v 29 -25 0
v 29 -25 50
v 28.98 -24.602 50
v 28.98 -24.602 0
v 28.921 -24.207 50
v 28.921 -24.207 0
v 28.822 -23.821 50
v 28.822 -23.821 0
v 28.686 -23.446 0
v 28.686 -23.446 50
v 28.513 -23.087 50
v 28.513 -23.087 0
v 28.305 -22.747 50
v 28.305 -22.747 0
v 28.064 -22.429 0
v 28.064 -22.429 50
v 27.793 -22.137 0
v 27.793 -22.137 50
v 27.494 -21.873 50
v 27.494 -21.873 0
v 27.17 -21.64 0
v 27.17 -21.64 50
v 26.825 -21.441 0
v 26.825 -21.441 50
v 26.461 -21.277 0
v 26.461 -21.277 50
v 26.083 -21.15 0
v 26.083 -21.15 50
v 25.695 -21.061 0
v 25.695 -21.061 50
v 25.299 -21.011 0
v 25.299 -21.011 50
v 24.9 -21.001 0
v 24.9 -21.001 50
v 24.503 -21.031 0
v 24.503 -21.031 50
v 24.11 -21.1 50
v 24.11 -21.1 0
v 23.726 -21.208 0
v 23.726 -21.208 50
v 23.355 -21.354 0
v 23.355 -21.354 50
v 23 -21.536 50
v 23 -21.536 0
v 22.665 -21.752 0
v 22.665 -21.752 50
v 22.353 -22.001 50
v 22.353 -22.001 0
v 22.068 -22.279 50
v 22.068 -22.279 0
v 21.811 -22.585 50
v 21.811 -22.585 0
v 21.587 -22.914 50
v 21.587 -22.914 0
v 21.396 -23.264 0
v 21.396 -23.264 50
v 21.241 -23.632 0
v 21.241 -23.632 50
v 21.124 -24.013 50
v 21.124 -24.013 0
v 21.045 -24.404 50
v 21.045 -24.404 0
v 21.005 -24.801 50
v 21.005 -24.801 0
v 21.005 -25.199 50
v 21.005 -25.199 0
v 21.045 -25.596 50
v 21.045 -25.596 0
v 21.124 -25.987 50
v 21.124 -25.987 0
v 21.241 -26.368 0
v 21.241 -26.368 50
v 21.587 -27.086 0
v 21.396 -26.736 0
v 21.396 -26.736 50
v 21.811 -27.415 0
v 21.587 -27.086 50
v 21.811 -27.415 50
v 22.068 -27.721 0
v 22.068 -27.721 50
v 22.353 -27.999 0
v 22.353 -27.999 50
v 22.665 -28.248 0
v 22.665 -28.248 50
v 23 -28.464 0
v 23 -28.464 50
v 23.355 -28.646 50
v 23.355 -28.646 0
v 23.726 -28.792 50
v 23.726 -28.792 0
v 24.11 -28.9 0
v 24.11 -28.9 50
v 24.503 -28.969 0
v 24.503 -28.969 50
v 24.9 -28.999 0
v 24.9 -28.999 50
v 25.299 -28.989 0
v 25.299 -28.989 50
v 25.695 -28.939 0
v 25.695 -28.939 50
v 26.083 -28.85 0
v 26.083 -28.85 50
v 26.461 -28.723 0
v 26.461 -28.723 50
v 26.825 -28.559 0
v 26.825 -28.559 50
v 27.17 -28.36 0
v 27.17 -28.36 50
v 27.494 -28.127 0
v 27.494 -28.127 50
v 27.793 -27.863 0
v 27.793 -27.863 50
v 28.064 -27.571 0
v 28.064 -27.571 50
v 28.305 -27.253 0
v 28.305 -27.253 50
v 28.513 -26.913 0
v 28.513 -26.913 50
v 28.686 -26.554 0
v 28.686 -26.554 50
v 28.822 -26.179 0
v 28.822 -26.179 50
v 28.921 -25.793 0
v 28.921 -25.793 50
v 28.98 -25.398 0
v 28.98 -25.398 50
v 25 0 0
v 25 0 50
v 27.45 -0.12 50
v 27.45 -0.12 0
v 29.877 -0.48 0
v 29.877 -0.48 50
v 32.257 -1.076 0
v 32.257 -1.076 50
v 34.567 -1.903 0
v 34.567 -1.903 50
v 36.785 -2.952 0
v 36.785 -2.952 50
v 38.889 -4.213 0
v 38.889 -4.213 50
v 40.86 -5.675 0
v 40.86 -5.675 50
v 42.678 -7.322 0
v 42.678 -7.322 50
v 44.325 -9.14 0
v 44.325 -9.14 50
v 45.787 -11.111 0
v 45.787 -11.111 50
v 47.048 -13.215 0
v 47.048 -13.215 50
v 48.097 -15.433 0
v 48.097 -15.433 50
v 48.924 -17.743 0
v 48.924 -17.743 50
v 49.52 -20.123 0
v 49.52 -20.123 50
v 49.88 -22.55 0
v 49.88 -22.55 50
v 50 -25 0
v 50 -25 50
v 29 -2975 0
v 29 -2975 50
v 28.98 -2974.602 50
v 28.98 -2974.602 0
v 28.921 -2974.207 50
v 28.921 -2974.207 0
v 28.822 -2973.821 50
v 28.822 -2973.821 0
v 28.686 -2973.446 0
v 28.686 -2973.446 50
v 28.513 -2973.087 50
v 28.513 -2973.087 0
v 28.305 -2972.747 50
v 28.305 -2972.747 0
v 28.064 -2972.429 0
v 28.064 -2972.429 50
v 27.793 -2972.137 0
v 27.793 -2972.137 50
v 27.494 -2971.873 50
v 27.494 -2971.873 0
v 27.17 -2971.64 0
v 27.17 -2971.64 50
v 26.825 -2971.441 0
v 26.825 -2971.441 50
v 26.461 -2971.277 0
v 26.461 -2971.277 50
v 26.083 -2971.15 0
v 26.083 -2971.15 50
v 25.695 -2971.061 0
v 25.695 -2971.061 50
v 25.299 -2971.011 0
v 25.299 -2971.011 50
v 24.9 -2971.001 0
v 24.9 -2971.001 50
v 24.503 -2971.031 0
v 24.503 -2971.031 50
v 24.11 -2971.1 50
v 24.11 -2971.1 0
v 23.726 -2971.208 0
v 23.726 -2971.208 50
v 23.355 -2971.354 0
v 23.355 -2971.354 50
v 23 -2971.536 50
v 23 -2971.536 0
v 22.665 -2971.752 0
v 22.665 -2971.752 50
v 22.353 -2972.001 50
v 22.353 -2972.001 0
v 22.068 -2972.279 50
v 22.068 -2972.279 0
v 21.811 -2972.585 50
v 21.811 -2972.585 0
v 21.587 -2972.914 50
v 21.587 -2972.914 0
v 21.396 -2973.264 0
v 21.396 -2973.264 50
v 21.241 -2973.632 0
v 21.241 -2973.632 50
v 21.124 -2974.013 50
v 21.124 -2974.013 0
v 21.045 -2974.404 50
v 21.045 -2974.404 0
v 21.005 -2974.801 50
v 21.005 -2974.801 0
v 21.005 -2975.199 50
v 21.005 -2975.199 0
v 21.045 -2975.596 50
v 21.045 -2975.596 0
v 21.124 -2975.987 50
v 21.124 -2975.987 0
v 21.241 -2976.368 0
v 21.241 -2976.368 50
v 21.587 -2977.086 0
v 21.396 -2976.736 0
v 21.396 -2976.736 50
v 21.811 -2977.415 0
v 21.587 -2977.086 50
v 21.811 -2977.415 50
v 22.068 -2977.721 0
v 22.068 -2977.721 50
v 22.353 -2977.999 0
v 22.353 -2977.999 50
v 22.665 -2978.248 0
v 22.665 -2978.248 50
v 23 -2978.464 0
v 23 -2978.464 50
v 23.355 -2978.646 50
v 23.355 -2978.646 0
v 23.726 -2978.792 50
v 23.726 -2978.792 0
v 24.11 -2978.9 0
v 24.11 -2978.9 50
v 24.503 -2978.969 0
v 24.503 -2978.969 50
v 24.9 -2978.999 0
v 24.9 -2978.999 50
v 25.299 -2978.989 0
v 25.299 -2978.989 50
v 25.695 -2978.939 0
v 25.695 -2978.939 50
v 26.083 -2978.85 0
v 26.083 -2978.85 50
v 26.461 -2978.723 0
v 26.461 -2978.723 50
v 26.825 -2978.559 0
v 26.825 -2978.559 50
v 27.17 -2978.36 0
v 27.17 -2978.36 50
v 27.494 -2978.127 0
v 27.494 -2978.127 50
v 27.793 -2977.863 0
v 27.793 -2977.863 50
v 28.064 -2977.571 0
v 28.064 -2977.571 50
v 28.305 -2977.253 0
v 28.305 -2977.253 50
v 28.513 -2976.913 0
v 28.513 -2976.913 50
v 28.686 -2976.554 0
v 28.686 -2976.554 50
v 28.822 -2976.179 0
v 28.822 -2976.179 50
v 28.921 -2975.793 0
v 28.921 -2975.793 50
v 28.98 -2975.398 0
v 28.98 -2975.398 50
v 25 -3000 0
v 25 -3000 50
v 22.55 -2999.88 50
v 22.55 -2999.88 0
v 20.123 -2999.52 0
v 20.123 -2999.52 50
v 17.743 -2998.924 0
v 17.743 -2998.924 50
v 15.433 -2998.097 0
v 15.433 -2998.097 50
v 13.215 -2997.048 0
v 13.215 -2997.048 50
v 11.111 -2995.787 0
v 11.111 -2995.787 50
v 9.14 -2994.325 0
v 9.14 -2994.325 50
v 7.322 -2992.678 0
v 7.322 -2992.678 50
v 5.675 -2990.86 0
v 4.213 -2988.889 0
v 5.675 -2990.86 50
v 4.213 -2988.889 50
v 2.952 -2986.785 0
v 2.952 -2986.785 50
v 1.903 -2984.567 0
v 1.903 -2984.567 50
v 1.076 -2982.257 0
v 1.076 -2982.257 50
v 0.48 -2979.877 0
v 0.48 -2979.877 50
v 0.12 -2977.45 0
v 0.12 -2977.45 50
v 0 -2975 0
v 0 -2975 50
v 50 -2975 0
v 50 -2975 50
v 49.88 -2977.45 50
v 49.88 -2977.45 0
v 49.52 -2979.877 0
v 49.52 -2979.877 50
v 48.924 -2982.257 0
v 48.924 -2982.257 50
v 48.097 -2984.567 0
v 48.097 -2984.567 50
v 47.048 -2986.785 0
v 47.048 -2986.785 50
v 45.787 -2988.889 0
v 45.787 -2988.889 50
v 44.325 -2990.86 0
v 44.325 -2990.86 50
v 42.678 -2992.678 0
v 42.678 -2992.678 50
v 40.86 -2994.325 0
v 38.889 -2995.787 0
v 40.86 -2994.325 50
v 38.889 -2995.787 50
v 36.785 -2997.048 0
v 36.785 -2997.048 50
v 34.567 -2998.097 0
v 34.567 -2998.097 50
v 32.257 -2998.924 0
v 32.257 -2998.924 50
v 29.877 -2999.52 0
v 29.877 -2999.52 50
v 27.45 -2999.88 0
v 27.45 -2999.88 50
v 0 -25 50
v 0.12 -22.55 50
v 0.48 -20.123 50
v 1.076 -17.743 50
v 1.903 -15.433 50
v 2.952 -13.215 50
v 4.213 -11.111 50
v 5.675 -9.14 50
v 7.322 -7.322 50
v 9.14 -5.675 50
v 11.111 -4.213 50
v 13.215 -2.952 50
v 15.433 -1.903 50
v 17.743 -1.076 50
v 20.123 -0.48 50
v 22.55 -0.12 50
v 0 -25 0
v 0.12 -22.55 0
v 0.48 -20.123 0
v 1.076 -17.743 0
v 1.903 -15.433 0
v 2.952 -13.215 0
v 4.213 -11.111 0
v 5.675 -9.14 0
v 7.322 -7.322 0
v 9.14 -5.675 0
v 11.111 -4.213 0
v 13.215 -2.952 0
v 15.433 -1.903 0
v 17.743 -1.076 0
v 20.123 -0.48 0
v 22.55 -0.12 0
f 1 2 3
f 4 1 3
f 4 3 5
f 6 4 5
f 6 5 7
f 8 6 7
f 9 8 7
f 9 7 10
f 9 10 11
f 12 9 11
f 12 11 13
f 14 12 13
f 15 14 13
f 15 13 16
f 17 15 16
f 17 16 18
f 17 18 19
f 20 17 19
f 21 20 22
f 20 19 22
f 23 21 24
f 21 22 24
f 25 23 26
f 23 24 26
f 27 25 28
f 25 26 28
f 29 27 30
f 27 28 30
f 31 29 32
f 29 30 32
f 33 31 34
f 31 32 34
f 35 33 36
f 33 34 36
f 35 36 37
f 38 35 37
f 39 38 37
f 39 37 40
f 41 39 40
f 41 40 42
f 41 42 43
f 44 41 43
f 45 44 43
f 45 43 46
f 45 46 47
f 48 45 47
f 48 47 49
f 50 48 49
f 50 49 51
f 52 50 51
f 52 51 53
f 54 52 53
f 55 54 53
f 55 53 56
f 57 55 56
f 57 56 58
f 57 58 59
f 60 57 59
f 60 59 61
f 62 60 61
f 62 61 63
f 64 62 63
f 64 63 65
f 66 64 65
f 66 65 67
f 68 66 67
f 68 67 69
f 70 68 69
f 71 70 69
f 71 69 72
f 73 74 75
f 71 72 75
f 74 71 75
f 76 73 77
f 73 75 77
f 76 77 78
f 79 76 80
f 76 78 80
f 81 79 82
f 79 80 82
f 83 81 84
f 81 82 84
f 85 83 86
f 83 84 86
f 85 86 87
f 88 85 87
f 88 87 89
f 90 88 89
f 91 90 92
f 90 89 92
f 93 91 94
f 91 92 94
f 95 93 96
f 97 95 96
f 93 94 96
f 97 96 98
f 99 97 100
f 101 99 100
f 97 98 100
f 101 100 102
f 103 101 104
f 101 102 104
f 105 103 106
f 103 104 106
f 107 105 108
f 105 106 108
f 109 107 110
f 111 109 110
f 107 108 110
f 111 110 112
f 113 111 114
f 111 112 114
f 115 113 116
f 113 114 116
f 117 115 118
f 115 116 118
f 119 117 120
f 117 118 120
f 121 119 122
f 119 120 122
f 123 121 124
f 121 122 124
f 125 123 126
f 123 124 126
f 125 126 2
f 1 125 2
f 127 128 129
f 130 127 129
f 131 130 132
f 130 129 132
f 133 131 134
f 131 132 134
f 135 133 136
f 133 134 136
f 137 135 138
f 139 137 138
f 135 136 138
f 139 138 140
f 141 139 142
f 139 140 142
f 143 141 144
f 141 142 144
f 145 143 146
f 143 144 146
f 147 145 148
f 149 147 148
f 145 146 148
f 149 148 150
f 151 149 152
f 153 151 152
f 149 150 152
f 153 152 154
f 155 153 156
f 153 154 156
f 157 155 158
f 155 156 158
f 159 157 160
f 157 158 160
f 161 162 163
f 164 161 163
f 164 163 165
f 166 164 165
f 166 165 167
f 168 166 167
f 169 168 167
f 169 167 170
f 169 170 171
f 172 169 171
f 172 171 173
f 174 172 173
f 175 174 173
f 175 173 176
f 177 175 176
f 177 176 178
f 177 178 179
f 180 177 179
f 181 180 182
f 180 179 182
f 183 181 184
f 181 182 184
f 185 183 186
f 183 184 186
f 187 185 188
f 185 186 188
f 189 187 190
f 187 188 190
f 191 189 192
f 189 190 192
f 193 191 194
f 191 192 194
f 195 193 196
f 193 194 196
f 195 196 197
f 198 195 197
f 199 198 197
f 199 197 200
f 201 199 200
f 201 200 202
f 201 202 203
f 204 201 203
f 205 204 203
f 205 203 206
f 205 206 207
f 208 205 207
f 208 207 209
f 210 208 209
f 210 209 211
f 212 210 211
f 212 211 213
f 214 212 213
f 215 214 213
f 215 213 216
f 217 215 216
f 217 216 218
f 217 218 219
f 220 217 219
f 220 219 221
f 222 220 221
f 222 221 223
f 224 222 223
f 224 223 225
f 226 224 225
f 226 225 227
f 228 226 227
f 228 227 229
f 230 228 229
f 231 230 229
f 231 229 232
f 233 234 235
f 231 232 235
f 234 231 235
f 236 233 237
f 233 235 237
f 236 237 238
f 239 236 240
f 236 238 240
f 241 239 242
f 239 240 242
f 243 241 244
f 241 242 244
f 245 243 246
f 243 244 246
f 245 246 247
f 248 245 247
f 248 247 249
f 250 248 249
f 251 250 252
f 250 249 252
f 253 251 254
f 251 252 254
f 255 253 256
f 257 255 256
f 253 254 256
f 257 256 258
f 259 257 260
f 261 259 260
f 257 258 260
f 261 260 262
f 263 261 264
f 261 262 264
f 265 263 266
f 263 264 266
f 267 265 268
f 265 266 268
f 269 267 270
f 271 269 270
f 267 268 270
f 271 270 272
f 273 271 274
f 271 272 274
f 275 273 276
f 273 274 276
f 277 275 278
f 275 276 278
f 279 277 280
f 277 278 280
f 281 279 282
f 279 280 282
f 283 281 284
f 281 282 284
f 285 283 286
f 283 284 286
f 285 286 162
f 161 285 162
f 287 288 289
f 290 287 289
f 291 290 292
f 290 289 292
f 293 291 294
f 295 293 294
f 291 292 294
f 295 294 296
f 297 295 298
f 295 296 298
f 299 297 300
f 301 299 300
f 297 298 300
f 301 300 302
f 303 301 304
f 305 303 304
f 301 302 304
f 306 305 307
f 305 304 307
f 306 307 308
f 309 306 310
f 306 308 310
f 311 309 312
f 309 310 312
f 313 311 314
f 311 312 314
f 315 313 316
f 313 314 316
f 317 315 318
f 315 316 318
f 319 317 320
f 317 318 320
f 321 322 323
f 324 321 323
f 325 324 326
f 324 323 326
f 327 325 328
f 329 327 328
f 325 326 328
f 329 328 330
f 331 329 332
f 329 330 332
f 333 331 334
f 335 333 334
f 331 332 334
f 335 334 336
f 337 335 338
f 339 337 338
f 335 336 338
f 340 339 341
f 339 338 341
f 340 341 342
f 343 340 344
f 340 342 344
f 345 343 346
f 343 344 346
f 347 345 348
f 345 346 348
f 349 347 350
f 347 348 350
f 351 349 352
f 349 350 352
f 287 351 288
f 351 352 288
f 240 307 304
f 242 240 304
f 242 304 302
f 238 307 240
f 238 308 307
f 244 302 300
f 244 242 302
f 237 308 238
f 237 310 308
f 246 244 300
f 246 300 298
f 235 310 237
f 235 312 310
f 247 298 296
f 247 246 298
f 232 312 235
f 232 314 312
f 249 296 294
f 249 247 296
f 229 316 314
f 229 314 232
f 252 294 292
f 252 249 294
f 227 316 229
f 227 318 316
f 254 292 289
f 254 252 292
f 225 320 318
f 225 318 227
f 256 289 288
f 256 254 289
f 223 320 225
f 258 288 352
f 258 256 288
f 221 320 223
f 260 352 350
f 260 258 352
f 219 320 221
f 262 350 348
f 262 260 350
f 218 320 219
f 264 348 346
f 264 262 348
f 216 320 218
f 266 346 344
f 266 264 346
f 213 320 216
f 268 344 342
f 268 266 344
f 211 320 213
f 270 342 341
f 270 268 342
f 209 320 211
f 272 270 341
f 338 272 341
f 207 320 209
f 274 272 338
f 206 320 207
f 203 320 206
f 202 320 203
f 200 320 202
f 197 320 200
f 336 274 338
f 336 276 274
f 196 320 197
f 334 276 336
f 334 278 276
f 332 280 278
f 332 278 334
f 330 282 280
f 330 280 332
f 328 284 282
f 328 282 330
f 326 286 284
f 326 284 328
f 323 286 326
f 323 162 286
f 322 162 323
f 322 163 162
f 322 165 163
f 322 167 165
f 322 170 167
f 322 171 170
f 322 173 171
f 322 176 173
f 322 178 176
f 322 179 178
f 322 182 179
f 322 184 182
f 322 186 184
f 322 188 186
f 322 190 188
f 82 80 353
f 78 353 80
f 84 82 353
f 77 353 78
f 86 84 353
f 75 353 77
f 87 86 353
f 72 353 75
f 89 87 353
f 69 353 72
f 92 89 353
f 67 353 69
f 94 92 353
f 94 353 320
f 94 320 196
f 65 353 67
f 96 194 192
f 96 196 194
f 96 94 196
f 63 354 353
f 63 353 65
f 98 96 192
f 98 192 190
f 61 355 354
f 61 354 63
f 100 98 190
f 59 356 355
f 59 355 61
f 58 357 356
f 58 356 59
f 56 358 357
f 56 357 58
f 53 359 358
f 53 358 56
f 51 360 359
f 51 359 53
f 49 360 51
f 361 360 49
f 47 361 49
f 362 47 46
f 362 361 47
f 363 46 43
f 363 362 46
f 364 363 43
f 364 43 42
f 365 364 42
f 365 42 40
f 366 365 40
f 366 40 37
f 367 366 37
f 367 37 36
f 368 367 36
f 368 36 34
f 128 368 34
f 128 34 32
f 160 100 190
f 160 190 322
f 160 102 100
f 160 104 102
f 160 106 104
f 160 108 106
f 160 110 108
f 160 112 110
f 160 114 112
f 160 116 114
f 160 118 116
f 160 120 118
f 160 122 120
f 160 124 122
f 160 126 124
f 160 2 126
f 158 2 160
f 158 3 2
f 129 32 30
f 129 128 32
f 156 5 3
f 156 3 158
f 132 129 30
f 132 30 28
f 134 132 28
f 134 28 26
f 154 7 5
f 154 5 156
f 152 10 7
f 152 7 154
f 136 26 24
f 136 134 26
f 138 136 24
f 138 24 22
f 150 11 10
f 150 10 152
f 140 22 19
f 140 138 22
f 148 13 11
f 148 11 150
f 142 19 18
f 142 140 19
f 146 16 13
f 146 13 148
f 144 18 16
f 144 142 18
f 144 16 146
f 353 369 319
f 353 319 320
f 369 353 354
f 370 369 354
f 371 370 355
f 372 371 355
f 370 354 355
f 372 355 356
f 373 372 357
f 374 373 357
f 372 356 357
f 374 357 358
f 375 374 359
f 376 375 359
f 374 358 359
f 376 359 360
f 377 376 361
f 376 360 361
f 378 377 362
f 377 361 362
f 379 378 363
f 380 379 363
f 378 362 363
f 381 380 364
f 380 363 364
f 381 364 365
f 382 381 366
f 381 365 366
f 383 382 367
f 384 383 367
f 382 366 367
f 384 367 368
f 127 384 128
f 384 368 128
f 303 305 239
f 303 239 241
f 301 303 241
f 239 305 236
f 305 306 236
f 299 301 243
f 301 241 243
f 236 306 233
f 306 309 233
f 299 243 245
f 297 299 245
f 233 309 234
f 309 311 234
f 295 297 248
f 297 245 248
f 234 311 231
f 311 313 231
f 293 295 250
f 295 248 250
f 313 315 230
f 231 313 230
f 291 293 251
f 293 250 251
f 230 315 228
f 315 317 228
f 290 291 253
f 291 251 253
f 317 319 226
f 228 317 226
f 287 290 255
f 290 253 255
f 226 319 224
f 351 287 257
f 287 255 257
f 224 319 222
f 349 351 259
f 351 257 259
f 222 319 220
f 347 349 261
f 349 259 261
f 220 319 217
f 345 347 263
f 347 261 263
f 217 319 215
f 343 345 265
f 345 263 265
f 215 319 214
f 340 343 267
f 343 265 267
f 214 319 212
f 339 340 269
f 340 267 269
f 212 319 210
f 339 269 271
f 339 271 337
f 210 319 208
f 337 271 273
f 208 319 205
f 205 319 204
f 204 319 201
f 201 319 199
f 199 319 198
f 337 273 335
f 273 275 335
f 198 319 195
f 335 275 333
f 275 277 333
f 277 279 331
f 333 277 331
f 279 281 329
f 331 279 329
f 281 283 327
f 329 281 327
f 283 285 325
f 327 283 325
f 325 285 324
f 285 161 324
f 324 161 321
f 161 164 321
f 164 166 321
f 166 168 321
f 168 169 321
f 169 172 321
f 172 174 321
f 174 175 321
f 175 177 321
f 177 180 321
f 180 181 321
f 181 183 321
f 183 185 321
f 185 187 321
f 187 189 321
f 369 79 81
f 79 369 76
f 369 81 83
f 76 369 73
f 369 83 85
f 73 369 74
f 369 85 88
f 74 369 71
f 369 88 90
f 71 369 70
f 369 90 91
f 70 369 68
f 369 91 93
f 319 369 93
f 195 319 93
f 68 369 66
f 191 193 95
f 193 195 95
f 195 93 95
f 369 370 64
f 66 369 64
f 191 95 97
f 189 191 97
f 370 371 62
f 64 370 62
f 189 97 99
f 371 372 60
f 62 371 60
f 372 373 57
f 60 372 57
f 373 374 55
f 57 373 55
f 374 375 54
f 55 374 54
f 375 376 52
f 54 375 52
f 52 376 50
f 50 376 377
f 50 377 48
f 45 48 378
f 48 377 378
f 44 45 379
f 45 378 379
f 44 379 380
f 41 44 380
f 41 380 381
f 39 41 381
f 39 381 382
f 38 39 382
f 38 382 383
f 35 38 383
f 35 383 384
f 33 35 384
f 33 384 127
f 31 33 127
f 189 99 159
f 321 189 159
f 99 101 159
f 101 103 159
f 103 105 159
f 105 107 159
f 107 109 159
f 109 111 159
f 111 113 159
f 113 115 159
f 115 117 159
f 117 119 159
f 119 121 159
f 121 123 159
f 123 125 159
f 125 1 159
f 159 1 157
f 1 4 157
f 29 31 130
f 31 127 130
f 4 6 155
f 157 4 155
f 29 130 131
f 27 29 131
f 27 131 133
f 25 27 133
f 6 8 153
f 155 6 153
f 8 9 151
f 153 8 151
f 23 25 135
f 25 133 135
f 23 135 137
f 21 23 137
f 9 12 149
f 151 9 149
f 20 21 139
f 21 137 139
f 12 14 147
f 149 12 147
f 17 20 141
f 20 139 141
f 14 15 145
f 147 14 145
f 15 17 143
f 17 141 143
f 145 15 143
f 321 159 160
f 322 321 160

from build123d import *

# Parameters (mm, degrees)
F0_W     = 50
F0_H     = 50
F1_DEPTH = 3000
F2_R     = 4
F3_DEPTH = 50.001
F5_DEPTH = 50


with BuildPart() as f1:
    # F0 (on Front) → F1 (new body)
    with BuildSketch(Plane.XZ):
        with Locations((25, 25)):
            Rectangle(F0_W, F0_H)
    extrude(amount=F1_DEPTH)

    # F2 (on face) → F3 (cut, through all)
    with BuildSketch(Plane.XY.offset(50)):
        with Locations((25, -25)):
            Circle(F2_R)
        with Locations((25, -2975)):
            Circle(F2_R)
    extrude(amount=-F3_DEPTH, mode=Mode.SUBTRACT)

    # F4 (on face) → F5 (cut, through all)
    with BuildSketch(Plane.XY.offset(50)):
        with BuildLine():
            ThreePointArc((0, -25), (7.32233, -7.32233), (25, 0))
            Line((25, 0), (0, 0))
            Line((0, 0), (0, -25))
        make_face()
        with BuildLine():
            ThreePointArc((25, 0), (42.67767, -7.32233), (50, -25))
            Line((50, -25), (50, 0))
            Line((50, 0), (25, 0))
        make_face()
        with BuildLine():
            ThreePointArc((50, -2975), (42.67767, -2992.67767), (25, -3000))
            Line((25, -3000), (50, -3000))
            Line((50, -3000), (50, -2975))
        make_face()
        with BuildLine():
            ThreePointArc((25, -3000), (7.32233, -2992.67767), (0, -2975))
            Line((0, -2975), (0, -3000))
            Line((0, -3000), (25, -3000))
        make_face()
    extrude(amount=-F5_DEPTH, mode=Mode.SUBTRACT)


solid = f1.part
